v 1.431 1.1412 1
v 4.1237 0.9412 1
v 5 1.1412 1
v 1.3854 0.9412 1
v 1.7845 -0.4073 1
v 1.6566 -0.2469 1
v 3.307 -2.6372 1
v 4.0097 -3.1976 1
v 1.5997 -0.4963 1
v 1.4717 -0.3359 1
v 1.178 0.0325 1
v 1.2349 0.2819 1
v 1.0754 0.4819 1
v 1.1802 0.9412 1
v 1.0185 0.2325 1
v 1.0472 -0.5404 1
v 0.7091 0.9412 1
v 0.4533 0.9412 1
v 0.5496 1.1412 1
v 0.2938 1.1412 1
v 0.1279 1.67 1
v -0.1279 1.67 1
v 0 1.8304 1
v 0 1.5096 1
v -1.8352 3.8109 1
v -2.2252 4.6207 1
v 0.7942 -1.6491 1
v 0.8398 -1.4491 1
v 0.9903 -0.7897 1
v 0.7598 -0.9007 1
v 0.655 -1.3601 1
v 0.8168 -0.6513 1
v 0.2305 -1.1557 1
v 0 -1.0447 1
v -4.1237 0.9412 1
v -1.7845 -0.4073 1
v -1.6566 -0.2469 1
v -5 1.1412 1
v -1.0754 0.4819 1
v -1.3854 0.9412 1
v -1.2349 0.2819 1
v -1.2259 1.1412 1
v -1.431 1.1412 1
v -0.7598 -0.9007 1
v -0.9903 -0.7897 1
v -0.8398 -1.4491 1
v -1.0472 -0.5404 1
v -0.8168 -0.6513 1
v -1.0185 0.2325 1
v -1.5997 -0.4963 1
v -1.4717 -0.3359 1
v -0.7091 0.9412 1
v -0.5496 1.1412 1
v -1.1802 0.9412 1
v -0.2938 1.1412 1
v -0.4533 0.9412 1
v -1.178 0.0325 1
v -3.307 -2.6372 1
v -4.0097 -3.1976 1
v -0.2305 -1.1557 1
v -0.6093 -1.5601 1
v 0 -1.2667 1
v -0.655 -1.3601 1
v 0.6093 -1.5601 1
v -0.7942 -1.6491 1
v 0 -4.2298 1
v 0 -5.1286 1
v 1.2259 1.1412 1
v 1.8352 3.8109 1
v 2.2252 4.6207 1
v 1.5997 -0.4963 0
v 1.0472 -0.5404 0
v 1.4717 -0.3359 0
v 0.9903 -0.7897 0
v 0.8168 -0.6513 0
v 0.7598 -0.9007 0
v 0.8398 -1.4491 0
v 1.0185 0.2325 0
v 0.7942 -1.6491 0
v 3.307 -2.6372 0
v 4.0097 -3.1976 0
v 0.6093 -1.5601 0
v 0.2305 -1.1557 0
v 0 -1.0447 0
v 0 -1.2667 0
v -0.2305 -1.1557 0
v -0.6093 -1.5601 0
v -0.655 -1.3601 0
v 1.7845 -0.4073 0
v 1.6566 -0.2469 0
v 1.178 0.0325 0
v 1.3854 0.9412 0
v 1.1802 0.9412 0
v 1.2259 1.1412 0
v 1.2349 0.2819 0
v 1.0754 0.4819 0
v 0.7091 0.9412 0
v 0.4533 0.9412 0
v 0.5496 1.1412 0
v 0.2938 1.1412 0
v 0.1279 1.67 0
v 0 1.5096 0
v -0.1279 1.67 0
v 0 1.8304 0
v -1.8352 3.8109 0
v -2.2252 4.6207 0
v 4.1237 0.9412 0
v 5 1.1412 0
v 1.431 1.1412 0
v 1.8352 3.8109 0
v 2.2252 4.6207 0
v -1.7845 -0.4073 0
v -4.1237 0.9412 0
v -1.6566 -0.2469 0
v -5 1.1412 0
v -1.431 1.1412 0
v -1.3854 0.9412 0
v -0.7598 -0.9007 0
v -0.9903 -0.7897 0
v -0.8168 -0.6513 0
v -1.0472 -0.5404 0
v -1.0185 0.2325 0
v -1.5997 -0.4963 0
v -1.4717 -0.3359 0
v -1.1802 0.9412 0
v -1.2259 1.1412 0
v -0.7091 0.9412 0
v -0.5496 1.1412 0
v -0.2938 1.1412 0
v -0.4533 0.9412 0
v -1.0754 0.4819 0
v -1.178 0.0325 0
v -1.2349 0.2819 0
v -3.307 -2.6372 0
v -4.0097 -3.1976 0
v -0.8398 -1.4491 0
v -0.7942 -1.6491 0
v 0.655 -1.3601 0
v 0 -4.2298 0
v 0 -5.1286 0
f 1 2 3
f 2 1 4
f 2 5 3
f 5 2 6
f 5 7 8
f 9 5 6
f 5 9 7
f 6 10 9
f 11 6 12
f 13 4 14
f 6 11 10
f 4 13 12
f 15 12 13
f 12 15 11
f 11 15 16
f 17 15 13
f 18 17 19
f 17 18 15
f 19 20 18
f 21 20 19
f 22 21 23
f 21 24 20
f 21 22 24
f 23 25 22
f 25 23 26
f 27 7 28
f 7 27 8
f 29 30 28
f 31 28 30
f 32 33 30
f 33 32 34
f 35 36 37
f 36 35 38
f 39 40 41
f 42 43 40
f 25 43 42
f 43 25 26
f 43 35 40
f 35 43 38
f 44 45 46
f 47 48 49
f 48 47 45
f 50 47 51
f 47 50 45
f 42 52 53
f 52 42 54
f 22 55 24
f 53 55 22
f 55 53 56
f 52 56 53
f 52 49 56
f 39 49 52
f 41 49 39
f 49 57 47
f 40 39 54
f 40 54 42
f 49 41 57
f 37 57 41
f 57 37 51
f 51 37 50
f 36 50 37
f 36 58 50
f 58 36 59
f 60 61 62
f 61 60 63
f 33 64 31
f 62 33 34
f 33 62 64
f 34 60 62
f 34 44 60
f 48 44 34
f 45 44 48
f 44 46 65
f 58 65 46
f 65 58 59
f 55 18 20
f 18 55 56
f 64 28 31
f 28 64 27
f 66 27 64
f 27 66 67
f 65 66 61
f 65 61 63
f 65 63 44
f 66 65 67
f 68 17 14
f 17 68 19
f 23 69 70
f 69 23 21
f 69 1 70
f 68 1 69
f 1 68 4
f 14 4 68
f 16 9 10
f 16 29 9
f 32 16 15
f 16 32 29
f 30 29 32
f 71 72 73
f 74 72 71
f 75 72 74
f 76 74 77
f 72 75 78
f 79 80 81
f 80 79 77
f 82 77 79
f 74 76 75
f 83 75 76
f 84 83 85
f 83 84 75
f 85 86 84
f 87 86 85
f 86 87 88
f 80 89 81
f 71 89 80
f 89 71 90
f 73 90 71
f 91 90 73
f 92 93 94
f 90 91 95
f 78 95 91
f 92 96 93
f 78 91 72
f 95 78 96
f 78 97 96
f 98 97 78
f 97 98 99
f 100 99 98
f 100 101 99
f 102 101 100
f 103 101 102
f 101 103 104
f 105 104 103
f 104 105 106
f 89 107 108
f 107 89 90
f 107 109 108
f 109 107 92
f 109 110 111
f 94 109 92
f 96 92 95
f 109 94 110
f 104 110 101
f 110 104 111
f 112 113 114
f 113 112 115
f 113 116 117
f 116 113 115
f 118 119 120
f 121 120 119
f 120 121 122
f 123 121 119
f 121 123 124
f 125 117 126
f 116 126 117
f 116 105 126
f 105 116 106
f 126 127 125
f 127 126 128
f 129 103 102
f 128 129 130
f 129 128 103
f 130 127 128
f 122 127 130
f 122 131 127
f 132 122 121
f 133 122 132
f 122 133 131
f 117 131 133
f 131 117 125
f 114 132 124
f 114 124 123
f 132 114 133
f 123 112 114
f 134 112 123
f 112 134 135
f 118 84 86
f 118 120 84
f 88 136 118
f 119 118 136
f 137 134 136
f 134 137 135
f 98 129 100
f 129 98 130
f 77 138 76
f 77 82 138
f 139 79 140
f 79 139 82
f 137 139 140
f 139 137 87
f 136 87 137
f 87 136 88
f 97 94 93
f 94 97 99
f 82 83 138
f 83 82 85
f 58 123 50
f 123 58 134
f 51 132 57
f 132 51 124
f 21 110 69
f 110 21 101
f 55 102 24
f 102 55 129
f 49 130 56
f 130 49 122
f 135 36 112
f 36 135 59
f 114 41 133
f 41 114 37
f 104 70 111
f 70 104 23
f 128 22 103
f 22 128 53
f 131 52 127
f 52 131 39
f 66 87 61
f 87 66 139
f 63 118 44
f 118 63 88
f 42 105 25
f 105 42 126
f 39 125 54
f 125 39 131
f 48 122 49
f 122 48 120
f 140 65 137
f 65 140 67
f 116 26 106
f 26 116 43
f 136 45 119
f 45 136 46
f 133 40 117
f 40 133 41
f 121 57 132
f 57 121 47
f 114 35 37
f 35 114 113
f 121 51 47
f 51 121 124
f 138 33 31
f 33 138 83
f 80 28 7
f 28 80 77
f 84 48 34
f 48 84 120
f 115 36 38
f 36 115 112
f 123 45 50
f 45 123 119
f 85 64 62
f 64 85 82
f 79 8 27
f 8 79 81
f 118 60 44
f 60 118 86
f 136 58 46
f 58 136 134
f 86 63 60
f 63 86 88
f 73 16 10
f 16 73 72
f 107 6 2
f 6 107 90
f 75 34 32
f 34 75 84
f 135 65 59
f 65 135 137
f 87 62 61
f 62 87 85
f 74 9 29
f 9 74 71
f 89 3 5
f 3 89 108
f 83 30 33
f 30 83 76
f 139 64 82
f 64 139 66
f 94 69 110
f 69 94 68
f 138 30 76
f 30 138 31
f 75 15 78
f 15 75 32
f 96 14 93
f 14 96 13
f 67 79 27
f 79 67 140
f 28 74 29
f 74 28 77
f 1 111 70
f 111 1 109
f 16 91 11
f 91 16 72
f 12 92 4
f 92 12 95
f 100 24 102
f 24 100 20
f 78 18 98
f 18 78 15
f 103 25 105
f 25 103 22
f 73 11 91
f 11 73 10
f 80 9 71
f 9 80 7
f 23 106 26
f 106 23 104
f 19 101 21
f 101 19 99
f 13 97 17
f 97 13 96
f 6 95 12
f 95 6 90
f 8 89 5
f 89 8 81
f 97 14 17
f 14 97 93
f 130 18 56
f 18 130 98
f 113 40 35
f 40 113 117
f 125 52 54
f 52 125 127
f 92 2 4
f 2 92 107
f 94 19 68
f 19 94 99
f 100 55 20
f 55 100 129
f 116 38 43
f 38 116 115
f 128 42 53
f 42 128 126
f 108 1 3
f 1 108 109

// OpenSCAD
//Customizable Star Polygon
//Created by Ari M. Diacou, January 2014
//Shared under Creative Commons License: Attribution-ShareAlike 3.0 Unported (CC BY-SA 3.0) 
//see http://creativecommons.org/licenses/by-sa/3.0/

// preview[view:south, tilt:top diagonal]
//The length of one of the sides of the star
length=10;
//The thickness of one of the sides of the star
thickness=.2;
//The height of one of the sides of the star
height=1;
//Vertices (number of points)
p=7;//[5,7,9,11,13,15,17,19]
//Density
//q=5;

/* HIDDEN */
angle=abs(180/p); echo("angle = ",angle);//internal angle of the points
circle_radius=length/(2*sin(2*angle));echo("circle_radius = ",circle_radius);//circle that the polygon is inscribed in
sagitta=circle_radius-sqrt(circle_radius*circle_radius-.25*length*length);echo("sagitta = ",sagitta); //distance from a vertex to the side of the polygon at the vertex's base
side_length=2*sagitta*sin(angle/2)/cos(angle/2); echo("side_length = ",side_length);//the length of the side of the internal polygon
apothem=.5*side_length*cos(180/p)/sin(180/p); echo("apothem = ",apothem); //distance from the origin to one of the sides in the internal regular polygon

module side(){
	mirror([0,1,0]){
		difference(){
			cube([length,thickness,height]);
			rotate([0,0,angle]) 
				cube([thickness/sin(angle),thickness,height]);
			translate([length,0,0]) 	
				mirror([1,0,0]){
					rotate([0,0,angle]) 
						cube([thickness/sin(angle),thickness,height]);
					}
			}
		}
	}

for(i=[1:p]){
	   rotate([0,0,i*2*angle]) 
			translate([-length/2,apothem,0]) 
				side();
		}
